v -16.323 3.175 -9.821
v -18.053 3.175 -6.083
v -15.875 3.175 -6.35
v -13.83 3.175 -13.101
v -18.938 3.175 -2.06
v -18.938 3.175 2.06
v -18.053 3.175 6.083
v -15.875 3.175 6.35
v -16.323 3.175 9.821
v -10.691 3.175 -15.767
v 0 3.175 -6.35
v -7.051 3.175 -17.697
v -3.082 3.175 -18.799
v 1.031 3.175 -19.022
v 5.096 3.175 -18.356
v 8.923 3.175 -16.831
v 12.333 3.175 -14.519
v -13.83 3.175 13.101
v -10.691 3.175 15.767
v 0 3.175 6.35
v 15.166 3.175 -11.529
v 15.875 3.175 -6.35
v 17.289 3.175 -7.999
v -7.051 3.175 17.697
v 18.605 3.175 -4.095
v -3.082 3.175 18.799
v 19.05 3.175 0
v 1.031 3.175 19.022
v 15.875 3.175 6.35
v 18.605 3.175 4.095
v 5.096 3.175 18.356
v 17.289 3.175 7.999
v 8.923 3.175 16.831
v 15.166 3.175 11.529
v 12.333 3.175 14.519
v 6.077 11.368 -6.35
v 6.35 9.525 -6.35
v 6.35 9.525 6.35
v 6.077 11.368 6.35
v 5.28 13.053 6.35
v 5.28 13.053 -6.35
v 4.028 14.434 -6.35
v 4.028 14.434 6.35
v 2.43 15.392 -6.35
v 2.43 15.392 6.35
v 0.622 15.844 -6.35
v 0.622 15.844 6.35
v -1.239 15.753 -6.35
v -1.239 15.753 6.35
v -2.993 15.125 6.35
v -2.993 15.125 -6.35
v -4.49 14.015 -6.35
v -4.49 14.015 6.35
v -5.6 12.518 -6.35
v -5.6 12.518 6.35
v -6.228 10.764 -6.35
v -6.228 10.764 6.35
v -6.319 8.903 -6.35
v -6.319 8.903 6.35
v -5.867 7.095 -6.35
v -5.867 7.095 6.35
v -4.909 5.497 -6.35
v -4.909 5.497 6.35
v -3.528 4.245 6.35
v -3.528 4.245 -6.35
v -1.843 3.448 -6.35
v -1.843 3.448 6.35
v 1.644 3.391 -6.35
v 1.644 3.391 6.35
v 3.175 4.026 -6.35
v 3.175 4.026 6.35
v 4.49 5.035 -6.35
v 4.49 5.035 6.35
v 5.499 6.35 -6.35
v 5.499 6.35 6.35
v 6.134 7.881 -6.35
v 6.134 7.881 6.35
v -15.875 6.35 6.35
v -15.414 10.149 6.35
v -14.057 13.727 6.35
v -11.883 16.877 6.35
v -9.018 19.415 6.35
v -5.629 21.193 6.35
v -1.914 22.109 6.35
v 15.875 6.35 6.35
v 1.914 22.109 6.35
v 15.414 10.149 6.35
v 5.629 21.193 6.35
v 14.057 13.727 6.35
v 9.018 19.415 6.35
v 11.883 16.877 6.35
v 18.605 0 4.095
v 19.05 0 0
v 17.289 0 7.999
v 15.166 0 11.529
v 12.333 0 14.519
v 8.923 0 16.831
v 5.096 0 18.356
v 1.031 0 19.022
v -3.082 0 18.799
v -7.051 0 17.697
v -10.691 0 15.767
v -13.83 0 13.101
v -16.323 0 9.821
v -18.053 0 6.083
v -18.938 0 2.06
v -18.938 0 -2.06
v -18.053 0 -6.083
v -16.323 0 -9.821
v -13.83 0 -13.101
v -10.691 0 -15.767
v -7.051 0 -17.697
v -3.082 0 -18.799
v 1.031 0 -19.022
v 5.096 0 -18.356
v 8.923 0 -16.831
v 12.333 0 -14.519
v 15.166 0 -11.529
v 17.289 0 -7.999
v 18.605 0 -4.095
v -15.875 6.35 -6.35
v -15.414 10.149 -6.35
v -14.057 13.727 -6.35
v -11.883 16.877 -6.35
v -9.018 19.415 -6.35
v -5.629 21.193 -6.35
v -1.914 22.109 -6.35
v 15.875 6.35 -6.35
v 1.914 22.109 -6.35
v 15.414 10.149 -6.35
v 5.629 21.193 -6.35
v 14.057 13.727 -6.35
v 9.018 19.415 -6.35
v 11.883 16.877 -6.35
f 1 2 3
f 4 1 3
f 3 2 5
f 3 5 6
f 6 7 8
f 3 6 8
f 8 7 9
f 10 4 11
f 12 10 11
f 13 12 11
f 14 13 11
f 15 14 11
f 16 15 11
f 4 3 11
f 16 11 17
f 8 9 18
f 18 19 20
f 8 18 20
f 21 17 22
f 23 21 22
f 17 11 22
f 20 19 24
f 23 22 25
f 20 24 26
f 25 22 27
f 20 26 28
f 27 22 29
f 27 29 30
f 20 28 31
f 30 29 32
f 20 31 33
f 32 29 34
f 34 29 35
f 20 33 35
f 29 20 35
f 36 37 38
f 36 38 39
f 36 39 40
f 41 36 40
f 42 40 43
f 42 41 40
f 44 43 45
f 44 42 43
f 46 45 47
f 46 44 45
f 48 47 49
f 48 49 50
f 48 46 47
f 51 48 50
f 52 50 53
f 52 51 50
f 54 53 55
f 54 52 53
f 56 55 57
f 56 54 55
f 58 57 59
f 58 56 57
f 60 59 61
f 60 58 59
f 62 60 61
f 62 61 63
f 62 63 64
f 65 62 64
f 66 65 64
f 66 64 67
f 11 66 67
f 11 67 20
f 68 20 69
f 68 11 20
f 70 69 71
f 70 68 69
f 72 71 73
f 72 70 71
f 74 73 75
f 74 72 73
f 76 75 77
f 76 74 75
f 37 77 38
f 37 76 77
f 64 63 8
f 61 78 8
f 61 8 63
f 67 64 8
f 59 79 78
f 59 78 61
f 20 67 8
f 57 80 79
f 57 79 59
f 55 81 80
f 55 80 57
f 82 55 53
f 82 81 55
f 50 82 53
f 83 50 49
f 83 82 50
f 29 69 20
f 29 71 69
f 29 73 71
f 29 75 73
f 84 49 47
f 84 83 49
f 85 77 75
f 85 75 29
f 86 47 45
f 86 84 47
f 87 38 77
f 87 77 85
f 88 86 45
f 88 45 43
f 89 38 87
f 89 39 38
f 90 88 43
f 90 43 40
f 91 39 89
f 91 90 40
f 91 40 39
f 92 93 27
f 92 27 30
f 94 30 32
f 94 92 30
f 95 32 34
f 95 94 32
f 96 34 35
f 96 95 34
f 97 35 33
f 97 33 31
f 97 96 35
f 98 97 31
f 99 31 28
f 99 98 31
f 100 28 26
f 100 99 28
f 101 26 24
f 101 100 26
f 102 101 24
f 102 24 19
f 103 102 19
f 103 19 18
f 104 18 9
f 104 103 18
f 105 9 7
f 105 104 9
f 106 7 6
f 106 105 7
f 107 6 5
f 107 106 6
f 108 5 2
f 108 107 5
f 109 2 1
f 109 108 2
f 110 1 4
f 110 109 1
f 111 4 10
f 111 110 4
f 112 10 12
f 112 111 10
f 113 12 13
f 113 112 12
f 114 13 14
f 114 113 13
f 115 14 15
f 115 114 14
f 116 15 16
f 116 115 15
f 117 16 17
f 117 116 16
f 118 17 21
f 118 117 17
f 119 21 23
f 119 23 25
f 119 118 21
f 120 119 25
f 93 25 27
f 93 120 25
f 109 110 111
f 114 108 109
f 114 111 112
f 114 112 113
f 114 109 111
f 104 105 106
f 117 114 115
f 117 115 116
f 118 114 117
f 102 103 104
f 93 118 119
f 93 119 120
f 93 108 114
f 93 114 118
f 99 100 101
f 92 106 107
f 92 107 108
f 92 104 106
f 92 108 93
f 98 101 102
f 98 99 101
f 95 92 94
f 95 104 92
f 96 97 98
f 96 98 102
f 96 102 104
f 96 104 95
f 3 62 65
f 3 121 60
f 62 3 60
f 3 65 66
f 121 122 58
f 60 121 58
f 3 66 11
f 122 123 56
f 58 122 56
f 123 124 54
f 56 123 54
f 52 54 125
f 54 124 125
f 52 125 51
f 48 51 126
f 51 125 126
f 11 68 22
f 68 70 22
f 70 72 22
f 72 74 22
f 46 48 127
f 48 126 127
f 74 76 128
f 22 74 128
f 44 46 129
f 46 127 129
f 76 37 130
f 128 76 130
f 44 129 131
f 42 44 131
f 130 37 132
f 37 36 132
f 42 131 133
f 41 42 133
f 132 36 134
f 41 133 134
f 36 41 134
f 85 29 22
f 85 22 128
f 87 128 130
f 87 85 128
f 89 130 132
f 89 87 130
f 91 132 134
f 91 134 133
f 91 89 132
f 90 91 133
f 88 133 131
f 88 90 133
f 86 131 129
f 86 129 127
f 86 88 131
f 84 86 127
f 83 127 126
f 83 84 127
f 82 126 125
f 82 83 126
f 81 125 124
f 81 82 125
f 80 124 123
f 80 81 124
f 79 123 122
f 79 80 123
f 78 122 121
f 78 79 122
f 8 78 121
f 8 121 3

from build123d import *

# Parameters (mm, degrees)
F1_R     = 6.35
F2_DEPTH = 6.35
F0_R     = 19.05
F0_R_2   = 9.525
F3_DEPTH = 3.175


with BuildPart() as f2:
    # F1 (on Top) → F2 (new body, symmetric)
    with BuildSketch(Plane.XY):
        with BuildLine():
            ThreePointArc((15.875, 6.35), (0, 22.225), (-15.875, 6.35))
            Line((-15.875, 6.35), (-15.875, 0))
            Line((-15.875, 0), (15.875, 0))
            Line((15.875, 0), (15.875, 6.35))
        make_face()
        with Locations((0, 9.525)):
            Circle(F1_R, mode=Mode.SUBTRACT)
    extrude(amount=F2_DEPTH, both=True)

    # F0 (on Front) → F3 (join)
    with BuildSketch(Plane.XZ):
        Circle(F0_R)
        Circle(F0_R_2, mode=Mode.SUBTRACT)
        Circle(F0_R_2)
    extrude(amount=-F3_DEPTH)


solid = f2.part
